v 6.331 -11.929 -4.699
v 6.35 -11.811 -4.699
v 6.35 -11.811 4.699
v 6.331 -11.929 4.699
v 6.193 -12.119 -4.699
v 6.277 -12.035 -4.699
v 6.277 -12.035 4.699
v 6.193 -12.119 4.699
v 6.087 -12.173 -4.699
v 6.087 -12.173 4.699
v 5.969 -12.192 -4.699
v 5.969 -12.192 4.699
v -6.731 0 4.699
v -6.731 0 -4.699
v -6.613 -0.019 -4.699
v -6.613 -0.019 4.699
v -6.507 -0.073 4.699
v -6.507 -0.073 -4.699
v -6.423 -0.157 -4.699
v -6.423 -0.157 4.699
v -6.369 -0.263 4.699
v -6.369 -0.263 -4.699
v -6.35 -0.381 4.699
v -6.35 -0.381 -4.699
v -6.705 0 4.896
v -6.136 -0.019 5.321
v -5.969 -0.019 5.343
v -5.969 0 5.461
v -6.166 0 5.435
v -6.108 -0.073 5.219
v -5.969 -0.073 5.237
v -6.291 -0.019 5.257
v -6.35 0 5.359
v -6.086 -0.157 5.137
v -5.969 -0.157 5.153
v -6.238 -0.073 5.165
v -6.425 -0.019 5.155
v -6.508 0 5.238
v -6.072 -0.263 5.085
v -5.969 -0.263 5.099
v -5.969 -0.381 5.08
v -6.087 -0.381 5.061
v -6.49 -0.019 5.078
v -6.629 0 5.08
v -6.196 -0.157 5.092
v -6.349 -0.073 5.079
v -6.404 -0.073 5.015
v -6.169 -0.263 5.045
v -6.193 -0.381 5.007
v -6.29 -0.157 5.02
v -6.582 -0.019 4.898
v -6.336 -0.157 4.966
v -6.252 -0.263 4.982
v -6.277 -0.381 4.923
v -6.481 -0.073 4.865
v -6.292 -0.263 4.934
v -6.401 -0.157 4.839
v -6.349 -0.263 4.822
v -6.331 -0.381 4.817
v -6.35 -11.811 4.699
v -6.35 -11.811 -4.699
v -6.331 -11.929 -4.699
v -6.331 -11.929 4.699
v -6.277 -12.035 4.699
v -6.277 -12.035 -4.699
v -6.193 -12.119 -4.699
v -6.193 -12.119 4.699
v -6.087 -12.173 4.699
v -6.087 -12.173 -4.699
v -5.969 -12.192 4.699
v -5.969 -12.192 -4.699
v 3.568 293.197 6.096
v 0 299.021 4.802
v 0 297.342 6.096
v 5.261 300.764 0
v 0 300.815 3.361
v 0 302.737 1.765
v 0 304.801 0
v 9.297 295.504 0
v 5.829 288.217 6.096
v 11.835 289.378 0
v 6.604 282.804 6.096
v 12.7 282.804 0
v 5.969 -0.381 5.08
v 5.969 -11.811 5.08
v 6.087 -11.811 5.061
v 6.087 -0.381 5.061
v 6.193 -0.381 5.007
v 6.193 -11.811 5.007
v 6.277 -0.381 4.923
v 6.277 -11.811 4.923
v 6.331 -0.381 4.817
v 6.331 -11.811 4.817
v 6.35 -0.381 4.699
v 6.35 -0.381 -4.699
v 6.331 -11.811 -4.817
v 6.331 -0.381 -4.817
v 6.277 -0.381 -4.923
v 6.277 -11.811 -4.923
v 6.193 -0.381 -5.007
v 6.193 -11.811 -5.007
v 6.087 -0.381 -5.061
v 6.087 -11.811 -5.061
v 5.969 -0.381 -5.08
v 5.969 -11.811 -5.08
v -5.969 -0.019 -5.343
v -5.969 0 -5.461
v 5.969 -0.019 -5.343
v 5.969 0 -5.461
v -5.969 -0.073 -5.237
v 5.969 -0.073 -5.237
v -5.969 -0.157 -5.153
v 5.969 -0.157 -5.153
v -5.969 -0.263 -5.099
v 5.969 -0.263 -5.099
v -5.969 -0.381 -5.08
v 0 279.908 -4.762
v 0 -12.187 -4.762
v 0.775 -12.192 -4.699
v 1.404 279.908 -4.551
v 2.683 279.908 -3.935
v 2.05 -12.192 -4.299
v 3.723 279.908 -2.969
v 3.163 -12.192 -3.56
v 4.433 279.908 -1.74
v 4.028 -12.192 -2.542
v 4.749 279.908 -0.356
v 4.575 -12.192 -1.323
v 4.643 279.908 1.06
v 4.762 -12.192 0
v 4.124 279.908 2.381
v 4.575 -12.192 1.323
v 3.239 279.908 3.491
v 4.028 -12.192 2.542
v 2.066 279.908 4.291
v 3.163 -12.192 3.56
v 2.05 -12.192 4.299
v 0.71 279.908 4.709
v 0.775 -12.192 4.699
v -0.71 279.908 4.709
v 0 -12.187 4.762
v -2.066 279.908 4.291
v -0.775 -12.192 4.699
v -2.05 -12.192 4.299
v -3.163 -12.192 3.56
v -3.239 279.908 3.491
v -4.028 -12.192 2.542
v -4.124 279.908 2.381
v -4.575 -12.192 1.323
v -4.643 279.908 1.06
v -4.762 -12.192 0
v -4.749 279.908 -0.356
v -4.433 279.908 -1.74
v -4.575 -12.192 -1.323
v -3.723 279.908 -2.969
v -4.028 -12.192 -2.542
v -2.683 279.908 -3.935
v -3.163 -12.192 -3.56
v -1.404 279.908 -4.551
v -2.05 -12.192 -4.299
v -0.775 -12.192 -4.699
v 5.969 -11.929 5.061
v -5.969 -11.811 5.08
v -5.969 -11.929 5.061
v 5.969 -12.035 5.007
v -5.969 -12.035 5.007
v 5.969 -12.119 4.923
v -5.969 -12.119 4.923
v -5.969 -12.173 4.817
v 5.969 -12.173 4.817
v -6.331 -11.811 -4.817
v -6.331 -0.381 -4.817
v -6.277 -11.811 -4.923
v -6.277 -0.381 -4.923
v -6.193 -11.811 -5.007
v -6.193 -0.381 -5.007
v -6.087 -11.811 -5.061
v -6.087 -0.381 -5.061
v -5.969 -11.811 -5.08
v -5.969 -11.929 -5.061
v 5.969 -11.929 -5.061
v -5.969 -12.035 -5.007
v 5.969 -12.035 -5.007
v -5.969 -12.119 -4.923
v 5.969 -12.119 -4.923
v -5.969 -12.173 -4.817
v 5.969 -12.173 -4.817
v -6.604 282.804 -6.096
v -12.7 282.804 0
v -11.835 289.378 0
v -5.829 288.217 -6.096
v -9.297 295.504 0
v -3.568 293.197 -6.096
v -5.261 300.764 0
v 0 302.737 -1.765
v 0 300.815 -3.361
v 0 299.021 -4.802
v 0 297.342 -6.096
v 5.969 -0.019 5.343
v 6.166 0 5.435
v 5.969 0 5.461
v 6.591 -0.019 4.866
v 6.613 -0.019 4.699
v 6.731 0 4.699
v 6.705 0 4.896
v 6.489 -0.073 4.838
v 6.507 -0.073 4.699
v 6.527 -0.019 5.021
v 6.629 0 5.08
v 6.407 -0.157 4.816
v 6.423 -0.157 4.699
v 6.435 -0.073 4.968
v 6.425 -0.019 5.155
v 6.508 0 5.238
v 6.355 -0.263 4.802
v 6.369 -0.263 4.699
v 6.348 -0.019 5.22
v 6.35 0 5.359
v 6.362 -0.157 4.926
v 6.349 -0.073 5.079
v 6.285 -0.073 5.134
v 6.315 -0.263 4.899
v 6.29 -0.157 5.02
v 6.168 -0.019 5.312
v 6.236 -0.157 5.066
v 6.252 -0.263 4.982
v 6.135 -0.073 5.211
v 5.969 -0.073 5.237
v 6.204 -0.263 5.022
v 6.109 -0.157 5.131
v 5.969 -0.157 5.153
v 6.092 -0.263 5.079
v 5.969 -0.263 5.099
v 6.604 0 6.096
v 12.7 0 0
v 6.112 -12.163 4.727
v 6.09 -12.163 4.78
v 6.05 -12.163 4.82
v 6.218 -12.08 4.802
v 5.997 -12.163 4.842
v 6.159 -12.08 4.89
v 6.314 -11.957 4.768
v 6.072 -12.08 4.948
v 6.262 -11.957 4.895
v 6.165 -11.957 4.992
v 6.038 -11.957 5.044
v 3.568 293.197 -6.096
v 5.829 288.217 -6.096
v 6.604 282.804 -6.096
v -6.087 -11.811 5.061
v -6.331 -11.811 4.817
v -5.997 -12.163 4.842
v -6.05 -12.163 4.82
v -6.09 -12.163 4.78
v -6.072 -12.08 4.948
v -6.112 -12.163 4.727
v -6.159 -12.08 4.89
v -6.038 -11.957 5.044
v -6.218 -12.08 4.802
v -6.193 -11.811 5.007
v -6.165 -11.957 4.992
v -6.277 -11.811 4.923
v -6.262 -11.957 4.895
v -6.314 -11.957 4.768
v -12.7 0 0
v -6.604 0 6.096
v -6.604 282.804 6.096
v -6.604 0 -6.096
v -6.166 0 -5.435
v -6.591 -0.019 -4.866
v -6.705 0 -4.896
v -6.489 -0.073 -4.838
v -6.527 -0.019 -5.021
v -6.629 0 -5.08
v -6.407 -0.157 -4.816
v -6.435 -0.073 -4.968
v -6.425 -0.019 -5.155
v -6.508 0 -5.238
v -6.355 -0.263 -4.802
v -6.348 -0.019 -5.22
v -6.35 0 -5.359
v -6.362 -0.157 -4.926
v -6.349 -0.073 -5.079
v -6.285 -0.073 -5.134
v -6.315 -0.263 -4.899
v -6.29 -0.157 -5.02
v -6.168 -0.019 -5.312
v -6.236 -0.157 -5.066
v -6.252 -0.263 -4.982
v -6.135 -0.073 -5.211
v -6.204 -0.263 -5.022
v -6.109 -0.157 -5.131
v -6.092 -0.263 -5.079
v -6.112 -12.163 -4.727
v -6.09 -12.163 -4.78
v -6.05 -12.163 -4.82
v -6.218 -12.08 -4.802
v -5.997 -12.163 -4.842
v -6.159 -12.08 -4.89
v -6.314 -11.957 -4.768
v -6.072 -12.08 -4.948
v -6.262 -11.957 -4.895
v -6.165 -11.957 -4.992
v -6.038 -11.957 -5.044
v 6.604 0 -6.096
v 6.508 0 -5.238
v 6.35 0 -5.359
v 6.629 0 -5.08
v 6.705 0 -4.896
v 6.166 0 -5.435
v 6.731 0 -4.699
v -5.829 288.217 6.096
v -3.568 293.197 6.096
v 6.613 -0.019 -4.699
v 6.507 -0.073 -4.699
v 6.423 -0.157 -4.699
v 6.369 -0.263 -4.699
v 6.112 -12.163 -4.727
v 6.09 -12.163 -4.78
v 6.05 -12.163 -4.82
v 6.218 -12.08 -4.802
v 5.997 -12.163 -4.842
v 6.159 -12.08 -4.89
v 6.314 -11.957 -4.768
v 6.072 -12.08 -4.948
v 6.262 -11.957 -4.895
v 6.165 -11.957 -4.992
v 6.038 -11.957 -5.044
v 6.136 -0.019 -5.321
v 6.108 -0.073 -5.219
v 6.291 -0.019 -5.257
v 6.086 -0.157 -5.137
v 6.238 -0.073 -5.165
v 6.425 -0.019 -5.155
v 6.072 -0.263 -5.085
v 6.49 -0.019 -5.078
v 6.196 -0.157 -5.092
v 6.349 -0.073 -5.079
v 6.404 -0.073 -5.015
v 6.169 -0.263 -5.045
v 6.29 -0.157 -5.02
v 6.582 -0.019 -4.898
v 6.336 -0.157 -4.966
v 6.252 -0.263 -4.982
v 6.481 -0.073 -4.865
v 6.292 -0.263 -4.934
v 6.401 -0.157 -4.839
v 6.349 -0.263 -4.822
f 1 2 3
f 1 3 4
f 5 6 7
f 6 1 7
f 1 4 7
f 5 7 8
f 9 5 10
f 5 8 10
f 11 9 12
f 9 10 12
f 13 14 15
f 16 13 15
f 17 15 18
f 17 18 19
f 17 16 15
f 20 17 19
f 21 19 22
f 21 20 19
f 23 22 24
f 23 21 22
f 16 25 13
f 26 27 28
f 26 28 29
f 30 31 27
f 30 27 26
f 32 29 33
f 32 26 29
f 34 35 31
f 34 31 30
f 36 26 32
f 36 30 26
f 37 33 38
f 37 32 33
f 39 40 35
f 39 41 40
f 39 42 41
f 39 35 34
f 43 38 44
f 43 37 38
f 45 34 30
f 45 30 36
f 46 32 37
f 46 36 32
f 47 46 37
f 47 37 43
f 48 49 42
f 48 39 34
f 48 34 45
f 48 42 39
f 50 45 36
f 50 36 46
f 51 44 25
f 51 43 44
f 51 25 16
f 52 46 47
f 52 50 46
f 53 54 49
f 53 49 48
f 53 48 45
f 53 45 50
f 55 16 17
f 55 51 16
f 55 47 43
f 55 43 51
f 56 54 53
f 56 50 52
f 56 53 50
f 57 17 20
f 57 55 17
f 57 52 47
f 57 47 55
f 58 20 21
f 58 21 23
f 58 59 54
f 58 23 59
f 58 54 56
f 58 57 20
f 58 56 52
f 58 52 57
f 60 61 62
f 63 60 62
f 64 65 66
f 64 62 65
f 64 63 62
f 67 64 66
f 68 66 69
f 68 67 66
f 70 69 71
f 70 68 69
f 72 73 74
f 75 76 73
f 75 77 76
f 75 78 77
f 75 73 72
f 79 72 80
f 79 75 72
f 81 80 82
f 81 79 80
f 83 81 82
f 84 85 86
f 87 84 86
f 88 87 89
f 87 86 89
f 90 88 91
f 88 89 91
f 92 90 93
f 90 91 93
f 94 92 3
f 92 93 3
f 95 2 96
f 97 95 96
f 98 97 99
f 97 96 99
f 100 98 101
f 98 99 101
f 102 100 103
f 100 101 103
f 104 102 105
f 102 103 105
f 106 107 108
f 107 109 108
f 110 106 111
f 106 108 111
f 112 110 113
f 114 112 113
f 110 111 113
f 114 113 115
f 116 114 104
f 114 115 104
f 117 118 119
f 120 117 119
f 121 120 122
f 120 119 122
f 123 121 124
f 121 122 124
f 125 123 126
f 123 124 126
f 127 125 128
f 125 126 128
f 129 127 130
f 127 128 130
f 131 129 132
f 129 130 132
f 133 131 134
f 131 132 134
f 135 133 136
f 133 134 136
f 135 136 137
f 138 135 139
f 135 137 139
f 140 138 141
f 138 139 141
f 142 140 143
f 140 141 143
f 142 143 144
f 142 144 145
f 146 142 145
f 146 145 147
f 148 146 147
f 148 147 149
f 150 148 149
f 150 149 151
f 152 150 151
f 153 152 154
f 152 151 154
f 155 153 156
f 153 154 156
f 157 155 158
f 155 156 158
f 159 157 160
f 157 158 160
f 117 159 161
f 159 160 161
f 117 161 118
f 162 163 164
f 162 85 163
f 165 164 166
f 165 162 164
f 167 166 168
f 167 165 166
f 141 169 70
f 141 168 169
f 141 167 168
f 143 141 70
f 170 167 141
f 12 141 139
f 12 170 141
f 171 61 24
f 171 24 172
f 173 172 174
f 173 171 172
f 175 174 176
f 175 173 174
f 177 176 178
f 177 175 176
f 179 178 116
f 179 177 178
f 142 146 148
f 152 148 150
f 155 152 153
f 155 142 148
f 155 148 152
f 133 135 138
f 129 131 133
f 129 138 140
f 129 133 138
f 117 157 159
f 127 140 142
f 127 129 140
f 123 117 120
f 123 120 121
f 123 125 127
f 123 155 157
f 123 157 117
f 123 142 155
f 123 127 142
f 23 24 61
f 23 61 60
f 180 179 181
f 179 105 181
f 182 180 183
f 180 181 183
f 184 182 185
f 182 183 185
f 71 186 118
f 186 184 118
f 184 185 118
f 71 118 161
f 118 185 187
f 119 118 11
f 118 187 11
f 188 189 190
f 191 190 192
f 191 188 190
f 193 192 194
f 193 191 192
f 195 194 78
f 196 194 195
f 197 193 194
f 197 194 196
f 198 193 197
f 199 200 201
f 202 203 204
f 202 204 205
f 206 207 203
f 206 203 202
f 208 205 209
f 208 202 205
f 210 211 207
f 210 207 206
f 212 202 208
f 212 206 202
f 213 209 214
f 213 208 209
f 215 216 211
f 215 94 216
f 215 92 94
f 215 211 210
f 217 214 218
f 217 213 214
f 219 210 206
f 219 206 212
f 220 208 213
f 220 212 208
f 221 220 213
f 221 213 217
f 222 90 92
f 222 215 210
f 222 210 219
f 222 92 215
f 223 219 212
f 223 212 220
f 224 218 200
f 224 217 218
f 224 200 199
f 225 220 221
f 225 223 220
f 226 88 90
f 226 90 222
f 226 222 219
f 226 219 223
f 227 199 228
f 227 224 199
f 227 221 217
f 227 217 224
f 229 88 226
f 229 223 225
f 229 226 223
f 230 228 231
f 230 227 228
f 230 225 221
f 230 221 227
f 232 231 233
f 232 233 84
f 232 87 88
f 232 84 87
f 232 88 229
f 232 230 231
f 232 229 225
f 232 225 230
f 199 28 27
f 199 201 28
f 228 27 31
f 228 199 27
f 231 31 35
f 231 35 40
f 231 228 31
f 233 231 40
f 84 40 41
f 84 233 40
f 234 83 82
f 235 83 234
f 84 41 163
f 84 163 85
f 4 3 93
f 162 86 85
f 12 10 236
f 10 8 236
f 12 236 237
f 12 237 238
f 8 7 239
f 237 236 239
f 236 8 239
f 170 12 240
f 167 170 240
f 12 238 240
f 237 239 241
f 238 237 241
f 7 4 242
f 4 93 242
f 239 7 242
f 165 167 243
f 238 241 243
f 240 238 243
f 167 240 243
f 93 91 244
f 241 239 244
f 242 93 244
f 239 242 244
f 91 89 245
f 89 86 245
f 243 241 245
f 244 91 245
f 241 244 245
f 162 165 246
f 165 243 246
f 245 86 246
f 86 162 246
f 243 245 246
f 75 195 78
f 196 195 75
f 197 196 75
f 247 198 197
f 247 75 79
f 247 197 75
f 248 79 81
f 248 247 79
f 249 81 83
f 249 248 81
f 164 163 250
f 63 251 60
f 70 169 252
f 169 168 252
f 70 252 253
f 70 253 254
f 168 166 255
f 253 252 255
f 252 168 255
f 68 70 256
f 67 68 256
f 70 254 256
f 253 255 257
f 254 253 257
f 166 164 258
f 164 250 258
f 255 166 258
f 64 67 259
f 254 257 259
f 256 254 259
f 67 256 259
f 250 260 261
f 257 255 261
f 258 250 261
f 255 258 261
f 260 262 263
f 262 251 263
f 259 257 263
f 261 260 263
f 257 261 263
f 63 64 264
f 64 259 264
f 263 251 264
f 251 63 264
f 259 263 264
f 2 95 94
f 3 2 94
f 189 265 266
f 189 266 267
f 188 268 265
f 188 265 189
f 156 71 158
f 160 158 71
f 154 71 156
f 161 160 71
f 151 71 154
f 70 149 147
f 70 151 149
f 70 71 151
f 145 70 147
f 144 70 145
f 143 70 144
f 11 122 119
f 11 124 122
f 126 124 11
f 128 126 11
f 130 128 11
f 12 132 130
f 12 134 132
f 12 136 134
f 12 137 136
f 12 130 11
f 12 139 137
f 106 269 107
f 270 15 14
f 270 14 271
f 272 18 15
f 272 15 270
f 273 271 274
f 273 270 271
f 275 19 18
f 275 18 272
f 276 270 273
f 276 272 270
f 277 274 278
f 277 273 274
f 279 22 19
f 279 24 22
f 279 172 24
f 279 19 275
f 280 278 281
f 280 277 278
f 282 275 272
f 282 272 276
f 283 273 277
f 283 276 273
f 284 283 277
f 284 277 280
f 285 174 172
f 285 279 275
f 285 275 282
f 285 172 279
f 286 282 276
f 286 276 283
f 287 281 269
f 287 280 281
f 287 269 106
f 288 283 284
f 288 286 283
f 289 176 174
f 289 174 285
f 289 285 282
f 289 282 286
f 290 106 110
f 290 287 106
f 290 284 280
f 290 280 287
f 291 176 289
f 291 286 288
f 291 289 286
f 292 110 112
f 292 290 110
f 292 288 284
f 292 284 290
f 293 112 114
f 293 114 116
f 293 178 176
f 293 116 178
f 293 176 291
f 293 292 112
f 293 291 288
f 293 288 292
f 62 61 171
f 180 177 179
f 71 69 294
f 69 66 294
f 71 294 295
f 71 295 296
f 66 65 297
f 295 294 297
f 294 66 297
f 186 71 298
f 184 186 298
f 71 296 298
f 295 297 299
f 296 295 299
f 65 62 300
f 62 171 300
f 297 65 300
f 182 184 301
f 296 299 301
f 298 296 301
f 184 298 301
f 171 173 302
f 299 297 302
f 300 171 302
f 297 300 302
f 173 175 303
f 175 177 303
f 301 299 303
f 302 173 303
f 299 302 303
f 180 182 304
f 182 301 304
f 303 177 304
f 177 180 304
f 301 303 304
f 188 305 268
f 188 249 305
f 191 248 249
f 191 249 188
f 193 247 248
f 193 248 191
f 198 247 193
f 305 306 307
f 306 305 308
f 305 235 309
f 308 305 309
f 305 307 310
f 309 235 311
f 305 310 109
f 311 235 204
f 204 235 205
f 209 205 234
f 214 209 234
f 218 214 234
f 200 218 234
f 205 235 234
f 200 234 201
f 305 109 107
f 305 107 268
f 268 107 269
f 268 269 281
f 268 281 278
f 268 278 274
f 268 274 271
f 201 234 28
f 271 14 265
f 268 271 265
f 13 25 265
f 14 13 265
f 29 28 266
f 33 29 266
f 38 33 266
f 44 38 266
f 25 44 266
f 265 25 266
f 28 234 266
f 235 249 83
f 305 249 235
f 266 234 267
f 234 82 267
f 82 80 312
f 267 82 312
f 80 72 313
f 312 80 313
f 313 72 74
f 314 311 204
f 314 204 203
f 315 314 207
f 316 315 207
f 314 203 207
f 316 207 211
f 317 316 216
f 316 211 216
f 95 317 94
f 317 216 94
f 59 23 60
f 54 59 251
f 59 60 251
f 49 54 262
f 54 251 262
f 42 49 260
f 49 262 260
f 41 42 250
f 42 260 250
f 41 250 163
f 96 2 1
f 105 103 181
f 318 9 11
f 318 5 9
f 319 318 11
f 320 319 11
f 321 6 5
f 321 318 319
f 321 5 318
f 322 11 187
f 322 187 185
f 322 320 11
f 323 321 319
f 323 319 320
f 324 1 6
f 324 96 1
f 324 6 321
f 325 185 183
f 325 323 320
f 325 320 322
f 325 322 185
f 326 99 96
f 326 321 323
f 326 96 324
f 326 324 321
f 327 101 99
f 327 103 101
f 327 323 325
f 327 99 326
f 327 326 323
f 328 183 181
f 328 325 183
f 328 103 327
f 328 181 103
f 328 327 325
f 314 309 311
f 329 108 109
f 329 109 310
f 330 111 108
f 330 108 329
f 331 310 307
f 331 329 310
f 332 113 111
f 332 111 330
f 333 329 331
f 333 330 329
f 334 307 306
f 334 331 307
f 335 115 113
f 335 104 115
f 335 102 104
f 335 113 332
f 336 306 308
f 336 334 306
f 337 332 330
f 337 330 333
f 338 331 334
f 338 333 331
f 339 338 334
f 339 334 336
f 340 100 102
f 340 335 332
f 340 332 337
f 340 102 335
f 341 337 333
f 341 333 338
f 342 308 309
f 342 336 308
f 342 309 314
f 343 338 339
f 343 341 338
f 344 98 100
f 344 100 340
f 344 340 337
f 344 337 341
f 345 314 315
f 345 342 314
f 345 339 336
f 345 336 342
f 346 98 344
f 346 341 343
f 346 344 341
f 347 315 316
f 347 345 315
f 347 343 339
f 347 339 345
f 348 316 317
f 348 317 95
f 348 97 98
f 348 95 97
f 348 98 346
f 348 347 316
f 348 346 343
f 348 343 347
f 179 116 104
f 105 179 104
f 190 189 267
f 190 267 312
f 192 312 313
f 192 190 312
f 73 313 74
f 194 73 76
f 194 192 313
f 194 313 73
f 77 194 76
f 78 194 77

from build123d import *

# Parameters (mm, degrees)
BOSS_EXTRUDE1_DEPTH = 6.096
CHAMFER1_SIZE       = 6.096
SKETCH2_W           = 12.7
SKETCH2_H           = 10.16
BOSS_EXTRUDE2_DEPTH = 12.192
FILLET2_R           = 0.381
SKETCH3_R           = 4.7625
CUT_EXTRUDE1_DEPTH  = 292.1


with BuildPart() as part:
    # Sketch1 → Boss-Extrude1 (new, symmetric)
    with BuildSketch(Plane.XY):
        with BuildLine():
            Line((-12.7, 0), (-12.7, 282.8036))
            ThreePointArc((-12.7, 282.8036), (-9.297045256, 295.5036), (0, 304.800645256))
            ThreePointArc((0, 304.800645256), (9.297045256, 295.5036), (12.7, 282.8036))
            Line((12.7, 282.8036), (12.7, 0))
            Line((12.7, 0), (-12.7, 0))
        make_face()
    extrude(amount=BOSS_EXTRUDE1_DEPTH, both=True)

    # Chamfer1
    chamfer1_edges = [part.edges().sort_by_distance(p)[0] for p in [
        (-9.297045256, 295.5036, -6.096),
        (-12.7, 141.4018, -6.096),
        (-9.297045256, 295.5036, 6.096),
        (-12.7, 141.4018, 6.096),
        (9.297045256, 295.5036, 6.096),
        (12.7, 141.4018, 6.096),
        (9.297045256, 295.5036, -6.096),
        (12.7, 141.4018, -6.096),
    ]]
    chamfer(chamfer1_edges, length=CHAMFER1_SIZE - 0.0001)  # a hair under: the kernel refuses the full size

    # Sketch2 → Boss-Extrude2 (add)
    with BuildSketch(Plane.XZ):
        Rectangle(SKETCH2_W, SKETCH2_H)
    extrude(amount=BOSS_EXTRUDE2_DEPTH)

    # Fillet2
    fillet2_edges = [part.edges().sort_by_distance(p)[0] for p in [
        (6.35, 0, 0),
        (6.35, -6.096, -5.08),
        (0, 0, 5.08),
        (6.35, -6.096, 5.08),
        (-6.35, 0, 0),
        (-6.35, -6.096, 5.08),
        (0, 0, -5.08),
        (-6.35, -6.096, -5.08),
        (6.35, -12.192, 0),
        (0, -12.192, 5.08),
        (-6.35, -12.192, 0),
        (0, -12.192, -5.08),
    ]]
    fillet(fillet2_edges, radius=FILLET2_R)

    # Sketch3 → Cut-Extrude1 (cut)
    with BuildSketch(Plane.XZ.offset(12.192)):
        with Locations(Location((0, 0, 0), (0, 0, 270))):
            Circle(SKETCH3_R)
    extrude(amount=-CUT_EXTRUDE1_DEPTH, mode=Mode.SUBTRACT)


solid = part.part
